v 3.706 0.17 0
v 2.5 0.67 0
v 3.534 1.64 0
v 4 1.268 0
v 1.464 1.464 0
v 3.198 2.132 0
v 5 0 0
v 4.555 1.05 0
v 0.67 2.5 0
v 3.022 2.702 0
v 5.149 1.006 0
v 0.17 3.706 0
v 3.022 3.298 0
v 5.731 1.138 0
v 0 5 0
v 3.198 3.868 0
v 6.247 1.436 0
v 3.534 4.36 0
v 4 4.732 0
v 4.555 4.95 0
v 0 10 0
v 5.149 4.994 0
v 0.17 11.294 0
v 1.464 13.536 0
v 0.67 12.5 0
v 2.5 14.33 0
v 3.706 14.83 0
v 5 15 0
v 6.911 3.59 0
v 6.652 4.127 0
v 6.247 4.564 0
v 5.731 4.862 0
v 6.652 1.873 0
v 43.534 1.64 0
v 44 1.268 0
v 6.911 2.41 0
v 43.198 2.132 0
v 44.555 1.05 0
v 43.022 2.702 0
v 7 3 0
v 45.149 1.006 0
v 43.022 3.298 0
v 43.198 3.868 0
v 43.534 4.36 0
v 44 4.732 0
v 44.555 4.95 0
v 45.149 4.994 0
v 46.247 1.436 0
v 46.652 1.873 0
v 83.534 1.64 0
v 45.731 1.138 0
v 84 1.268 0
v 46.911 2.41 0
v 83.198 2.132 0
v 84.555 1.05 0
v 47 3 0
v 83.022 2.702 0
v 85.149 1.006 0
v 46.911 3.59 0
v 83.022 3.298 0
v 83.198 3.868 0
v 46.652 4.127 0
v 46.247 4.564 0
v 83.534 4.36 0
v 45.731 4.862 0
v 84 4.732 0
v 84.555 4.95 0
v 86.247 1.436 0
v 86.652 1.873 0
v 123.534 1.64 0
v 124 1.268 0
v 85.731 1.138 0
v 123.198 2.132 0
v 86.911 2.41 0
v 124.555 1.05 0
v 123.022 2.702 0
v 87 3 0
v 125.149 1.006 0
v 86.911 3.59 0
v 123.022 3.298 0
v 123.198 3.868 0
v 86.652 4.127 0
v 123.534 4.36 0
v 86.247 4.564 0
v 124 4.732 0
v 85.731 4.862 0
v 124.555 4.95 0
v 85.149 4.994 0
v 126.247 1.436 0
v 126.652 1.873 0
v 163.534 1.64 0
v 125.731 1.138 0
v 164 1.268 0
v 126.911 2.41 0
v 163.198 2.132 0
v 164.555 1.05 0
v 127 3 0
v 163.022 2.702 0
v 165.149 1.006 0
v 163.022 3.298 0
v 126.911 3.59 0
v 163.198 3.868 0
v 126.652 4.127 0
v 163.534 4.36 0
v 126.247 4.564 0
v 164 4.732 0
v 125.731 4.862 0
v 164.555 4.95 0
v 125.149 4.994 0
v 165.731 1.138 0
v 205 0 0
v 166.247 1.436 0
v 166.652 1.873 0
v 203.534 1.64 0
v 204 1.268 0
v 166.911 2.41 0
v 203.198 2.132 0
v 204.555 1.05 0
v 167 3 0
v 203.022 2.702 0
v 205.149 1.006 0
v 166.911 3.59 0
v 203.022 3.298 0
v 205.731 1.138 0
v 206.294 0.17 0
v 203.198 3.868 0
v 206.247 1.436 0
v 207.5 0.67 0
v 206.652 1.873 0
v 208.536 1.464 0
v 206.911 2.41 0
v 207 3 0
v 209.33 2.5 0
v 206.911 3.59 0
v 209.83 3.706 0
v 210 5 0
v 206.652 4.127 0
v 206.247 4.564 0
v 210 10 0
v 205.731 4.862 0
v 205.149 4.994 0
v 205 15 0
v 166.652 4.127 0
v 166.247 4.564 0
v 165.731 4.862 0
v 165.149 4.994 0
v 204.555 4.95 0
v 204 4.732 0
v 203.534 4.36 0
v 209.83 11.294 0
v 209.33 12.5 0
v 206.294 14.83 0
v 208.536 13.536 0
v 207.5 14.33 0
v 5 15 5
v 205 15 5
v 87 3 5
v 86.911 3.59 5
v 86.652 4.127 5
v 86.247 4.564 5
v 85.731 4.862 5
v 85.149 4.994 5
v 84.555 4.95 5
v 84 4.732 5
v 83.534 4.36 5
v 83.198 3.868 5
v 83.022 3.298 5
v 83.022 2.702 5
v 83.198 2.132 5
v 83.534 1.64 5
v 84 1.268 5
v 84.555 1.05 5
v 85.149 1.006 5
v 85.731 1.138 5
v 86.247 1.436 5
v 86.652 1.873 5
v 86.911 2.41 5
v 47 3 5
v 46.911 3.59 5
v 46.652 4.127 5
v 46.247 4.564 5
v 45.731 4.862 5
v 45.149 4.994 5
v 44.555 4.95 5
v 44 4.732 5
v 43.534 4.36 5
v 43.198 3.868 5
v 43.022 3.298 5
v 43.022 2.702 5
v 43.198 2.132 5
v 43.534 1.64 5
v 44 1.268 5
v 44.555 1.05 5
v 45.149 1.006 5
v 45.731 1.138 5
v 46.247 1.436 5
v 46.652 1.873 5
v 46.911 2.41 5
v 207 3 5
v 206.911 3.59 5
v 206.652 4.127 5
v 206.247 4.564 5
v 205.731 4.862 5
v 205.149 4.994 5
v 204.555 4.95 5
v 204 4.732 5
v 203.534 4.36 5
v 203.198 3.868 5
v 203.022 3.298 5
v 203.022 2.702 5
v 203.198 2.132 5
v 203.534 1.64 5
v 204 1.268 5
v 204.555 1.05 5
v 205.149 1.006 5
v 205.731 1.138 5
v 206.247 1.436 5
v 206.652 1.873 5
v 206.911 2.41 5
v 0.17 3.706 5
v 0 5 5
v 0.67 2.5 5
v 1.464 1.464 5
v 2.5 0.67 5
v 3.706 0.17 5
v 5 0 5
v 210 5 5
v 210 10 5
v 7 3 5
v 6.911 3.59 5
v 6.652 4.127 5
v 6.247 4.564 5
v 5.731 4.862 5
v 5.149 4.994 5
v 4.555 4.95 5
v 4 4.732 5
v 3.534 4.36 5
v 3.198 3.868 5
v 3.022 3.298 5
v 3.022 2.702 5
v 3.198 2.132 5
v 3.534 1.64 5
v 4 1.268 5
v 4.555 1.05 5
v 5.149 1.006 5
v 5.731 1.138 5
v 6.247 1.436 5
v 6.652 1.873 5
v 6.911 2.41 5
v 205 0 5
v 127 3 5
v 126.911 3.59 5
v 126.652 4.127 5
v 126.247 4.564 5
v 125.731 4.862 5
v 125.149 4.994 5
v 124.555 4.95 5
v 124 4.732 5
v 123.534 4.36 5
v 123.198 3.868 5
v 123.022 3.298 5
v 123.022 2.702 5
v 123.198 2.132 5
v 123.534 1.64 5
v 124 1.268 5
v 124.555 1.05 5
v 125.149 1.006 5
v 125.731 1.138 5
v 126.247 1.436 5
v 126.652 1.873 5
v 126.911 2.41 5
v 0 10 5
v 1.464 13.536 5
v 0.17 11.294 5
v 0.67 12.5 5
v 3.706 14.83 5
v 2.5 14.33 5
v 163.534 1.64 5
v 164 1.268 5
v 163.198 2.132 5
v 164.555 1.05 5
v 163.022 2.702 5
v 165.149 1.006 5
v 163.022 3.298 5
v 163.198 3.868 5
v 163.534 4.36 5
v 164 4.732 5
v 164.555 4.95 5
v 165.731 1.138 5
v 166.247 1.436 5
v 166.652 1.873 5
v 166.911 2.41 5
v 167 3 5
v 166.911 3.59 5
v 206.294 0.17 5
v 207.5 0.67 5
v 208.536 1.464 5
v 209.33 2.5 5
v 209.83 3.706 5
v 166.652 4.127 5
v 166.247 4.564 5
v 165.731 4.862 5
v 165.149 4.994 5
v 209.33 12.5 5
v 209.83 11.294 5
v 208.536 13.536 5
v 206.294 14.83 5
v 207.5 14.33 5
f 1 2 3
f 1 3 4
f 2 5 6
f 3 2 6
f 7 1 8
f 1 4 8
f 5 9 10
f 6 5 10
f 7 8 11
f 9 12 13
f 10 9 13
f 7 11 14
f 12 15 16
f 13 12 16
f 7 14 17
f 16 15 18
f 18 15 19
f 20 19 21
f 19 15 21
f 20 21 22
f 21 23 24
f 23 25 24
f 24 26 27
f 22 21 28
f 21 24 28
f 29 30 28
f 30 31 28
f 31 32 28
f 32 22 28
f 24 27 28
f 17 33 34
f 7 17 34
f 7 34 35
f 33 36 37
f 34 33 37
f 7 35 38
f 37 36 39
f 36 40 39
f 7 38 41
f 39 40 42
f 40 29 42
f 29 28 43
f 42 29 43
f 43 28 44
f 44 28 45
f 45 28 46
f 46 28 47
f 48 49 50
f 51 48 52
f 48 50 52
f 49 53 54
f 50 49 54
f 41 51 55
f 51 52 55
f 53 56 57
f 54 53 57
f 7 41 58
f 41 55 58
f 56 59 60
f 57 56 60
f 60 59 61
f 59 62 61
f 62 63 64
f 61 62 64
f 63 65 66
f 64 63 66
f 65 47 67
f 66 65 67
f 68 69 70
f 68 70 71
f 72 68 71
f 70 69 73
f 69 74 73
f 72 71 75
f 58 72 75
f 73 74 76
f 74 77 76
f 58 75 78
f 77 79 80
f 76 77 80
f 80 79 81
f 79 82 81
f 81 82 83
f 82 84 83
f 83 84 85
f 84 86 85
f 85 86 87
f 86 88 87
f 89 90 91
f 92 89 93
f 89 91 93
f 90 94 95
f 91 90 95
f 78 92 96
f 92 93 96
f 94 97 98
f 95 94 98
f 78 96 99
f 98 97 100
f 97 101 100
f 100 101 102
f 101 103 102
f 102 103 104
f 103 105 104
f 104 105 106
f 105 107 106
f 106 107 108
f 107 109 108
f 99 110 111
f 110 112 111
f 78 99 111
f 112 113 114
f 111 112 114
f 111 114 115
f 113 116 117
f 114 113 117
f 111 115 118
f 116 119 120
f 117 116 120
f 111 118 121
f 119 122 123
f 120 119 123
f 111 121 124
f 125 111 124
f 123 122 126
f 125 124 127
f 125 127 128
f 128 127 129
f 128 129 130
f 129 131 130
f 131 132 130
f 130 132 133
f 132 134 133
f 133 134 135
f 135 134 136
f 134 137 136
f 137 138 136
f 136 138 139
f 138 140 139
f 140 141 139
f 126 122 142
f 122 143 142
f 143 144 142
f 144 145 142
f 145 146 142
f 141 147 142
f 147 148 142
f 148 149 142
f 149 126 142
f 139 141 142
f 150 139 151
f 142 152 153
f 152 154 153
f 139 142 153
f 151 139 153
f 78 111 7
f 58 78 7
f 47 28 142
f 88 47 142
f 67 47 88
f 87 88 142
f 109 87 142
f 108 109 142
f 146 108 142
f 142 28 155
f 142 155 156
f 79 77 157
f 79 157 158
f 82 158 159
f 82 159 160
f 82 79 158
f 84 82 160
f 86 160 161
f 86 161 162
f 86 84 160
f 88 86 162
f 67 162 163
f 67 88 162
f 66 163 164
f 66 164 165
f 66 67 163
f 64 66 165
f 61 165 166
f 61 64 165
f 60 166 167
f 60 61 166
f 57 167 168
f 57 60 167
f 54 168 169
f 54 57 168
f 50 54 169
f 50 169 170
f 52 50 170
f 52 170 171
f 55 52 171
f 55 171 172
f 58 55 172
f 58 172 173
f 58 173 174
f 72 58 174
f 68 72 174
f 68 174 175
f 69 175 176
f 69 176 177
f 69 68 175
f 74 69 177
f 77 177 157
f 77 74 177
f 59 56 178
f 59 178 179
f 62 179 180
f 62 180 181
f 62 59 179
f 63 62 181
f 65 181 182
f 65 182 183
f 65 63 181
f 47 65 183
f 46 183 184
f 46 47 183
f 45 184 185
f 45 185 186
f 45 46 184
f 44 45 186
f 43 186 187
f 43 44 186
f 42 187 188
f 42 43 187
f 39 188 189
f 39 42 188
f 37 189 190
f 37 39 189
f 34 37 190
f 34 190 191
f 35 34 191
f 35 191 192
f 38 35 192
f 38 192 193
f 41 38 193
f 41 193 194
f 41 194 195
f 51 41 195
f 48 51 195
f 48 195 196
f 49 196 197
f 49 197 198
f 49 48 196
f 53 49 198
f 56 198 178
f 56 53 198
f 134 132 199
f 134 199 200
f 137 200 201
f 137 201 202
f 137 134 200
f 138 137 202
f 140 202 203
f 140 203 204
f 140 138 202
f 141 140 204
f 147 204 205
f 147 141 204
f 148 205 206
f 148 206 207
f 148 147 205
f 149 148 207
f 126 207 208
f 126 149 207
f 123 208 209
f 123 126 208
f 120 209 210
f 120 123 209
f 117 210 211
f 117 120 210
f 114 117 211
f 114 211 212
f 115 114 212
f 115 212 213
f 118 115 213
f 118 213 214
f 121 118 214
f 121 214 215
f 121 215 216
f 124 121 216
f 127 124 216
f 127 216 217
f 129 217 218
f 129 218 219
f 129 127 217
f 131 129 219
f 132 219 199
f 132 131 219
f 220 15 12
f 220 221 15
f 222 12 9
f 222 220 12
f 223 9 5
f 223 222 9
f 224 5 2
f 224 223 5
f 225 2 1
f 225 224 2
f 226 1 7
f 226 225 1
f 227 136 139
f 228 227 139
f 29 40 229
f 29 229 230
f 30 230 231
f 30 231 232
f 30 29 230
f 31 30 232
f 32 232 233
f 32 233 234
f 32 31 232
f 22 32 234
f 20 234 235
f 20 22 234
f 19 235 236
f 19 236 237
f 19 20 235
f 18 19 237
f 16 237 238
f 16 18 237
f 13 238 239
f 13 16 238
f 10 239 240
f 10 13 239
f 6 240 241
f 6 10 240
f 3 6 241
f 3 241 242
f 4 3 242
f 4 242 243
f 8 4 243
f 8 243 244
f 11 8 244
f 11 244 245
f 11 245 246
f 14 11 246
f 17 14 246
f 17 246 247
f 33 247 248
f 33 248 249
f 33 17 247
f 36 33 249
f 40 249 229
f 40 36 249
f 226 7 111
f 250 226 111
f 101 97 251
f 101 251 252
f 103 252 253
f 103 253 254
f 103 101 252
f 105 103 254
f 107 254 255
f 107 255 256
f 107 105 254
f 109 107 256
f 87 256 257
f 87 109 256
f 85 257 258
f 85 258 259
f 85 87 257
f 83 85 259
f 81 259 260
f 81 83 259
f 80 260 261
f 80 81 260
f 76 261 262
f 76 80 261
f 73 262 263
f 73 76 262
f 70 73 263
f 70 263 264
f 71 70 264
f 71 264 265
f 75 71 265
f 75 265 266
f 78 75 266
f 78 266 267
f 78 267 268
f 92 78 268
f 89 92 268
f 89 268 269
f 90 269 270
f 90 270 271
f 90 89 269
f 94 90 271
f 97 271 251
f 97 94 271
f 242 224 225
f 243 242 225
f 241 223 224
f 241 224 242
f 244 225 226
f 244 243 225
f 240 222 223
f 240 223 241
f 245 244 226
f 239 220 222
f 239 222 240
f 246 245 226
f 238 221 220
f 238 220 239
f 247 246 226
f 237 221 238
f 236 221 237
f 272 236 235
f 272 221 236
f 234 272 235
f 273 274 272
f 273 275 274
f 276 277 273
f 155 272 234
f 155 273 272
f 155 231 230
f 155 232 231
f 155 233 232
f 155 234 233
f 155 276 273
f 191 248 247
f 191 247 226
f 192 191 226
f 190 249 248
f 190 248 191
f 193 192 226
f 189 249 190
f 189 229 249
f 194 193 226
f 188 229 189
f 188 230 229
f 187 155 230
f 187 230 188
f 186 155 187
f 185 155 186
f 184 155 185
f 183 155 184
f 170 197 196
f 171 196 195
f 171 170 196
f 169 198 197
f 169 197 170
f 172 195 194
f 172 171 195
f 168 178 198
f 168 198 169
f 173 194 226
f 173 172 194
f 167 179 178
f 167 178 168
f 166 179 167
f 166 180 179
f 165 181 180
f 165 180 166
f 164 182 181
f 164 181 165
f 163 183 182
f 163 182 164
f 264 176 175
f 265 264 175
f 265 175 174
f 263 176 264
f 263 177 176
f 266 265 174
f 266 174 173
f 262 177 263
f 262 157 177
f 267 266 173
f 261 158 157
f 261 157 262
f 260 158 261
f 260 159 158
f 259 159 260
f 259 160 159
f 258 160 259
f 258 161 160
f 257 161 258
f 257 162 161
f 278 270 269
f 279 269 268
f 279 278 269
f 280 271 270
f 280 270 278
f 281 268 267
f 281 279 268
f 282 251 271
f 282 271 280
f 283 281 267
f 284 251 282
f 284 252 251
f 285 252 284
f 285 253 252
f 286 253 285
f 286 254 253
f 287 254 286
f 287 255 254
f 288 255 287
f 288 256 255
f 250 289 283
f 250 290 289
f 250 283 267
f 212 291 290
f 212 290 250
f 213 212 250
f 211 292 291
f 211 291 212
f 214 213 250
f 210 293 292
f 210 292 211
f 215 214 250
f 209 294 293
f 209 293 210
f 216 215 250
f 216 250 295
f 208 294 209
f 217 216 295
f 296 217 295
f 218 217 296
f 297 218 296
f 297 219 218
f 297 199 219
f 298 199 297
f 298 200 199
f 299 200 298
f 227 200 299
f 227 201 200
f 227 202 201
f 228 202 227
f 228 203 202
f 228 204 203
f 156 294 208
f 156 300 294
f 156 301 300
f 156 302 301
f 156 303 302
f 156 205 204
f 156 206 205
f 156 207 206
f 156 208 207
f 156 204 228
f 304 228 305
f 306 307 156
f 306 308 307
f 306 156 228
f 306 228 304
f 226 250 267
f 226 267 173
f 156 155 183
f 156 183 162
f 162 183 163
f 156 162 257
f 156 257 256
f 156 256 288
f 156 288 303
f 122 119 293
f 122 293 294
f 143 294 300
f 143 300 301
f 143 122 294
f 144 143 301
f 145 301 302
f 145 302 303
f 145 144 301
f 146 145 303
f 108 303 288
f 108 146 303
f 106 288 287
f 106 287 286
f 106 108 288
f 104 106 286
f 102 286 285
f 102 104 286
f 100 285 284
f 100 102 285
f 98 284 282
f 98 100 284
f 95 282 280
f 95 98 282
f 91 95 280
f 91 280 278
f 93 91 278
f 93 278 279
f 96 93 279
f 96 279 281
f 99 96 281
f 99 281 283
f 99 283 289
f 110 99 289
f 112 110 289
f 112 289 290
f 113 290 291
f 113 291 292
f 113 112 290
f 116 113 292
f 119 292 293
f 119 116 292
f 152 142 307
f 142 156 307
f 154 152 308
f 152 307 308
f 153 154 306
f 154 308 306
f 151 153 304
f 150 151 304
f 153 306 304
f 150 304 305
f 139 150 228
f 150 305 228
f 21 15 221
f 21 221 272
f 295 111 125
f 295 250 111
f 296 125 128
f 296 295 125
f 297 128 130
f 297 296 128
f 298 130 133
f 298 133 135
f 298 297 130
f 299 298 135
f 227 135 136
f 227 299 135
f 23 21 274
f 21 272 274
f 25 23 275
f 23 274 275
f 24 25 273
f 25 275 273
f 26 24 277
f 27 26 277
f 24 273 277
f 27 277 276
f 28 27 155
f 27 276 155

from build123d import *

# Parameters (mm, degrees)
ESQUISSE1_W        = 210
ESQUISSE1_H        = 15
ESQUISSE1_R        = 2
BOSS_EXTRU_1_DEPTH = 5
CONG_1_R           = 5


with BuildPart() as part:
    # Esquisse1 → Boss.-Extru.1 (new body)
    with BuildSketch(Plane.XY):
        with Locations((105, 7.5)):
            Rectangle(ESQUISSE1_W, ESQUISSE1_H)
        with Locations((5, 3)):
            Circle(ESQUISSE1_R, mode=Mode.SUBTRACT)
        with Locations((45, 3)):
            Circle(ESQUISSE1_R, mode=Mode.SUBTRACT)
        with Locations((85, 3)):
            Circle(ESQUISSE1_R, mode=Mode.SUBTRACT)
        with Locations((125, 3)):
            Circle(ESQUISSE1_R, mode=Mode.SUBTRACT)
        with Locations((165, 3)):
            Circle(ESQUISSE1_R, mode=Mode.SUBTRACT)
        with Locations((205, 3)):
            Circle(ESQUISSE1_R, mode=Mode.SUBTRACT)
    extrude(amount=BOSS_EXTRU_1_DEPTH)

    # Congé1
    cong_1_edges = [part.edges().sort_by_distance(p)[0] for p in [
        (0, 15, 2.5),
        (210, 15, 2.5),
        (210, 0, 2.5),
        (0, 0, 2.5),
    ]]
    fillet(cong_1_edges, radius=CONG_1_R)


solid = part.part
